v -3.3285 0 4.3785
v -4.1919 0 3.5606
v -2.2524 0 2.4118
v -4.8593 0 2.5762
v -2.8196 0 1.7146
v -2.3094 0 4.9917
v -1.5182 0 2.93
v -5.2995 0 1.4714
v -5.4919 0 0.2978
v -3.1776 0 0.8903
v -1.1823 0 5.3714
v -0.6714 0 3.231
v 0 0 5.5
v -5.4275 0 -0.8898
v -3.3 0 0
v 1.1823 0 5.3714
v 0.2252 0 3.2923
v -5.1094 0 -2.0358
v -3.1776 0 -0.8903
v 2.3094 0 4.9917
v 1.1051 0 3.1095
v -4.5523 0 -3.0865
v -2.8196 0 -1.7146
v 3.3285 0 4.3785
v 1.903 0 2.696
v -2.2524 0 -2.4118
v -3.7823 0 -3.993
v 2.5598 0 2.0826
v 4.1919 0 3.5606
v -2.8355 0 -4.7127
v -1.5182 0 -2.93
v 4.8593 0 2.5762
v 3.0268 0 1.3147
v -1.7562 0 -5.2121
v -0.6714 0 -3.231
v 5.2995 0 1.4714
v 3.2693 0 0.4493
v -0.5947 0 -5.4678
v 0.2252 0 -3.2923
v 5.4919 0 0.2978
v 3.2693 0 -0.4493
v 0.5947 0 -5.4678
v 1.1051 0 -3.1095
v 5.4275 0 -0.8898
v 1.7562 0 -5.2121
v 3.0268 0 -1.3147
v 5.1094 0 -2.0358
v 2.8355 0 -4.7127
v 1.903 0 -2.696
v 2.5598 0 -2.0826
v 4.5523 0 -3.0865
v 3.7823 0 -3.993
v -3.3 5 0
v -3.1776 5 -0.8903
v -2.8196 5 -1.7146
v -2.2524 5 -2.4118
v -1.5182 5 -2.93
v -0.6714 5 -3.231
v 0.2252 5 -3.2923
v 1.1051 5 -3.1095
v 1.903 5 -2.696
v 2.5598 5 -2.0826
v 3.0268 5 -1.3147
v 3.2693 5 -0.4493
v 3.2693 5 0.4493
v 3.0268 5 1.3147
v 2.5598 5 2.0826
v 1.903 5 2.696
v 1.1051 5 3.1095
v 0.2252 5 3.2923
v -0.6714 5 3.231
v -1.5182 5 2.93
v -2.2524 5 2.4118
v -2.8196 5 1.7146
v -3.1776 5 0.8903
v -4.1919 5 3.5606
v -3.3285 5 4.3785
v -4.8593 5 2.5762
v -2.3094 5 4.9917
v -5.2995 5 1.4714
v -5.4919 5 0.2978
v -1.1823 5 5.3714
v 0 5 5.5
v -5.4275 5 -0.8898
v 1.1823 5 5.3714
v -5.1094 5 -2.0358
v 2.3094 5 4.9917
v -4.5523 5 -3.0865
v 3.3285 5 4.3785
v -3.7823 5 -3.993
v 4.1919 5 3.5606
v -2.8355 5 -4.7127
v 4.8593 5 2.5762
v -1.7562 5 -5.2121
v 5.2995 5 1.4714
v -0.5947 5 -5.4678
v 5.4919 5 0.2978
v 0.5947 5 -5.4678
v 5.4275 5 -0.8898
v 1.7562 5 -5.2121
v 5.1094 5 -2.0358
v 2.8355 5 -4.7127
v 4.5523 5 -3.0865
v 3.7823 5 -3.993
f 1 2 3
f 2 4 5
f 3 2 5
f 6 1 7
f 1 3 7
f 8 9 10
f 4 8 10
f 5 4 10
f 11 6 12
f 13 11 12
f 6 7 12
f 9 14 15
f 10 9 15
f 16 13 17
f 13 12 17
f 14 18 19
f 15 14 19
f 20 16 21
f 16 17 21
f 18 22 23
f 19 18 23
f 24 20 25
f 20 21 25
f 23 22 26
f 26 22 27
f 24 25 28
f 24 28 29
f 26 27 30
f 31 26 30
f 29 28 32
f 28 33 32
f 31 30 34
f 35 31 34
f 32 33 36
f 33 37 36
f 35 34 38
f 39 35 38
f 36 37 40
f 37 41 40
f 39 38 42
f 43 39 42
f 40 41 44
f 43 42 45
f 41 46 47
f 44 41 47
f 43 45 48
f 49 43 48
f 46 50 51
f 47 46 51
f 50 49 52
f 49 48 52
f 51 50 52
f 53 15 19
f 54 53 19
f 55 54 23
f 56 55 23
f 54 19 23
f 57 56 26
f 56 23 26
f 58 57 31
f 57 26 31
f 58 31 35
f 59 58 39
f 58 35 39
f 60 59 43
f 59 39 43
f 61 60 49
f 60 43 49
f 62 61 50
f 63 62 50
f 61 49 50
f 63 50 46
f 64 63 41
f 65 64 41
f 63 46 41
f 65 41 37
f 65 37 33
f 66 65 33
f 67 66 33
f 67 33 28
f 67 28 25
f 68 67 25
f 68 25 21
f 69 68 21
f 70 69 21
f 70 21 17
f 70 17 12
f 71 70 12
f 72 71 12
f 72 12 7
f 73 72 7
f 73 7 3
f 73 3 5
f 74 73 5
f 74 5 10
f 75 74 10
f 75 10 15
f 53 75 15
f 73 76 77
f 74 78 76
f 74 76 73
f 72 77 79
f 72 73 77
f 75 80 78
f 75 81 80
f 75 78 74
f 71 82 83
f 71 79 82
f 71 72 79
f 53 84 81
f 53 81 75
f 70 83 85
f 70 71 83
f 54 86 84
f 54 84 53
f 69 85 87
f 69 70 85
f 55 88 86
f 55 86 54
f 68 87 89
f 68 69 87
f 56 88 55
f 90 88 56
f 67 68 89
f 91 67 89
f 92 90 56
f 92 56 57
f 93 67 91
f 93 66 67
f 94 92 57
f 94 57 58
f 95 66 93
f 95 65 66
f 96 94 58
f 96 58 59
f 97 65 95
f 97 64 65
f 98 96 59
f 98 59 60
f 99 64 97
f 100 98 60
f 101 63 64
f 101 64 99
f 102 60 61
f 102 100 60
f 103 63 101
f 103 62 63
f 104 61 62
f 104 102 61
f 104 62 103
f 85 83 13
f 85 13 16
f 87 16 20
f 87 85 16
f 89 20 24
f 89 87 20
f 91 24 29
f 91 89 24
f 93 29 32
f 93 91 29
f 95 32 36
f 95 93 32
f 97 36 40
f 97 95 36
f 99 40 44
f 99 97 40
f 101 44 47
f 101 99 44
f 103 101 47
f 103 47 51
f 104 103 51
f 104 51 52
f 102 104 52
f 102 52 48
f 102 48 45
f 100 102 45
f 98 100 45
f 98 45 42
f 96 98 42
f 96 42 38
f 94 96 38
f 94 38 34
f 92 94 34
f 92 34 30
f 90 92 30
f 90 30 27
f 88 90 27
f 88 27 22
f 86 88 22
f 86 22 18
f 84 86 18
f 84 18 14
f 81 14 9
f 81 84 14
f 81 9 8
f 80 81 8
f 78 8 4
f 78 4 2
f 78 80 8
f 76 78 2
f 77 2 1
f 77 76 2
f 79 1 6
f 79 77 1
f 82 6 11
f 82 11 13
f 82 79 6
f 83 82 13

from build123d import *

# Parameters (mm, degrees)
SKETCH1_W            = 11
SKETCH1_H            = 11
BOSS_EXTRUDE1_DEPTH  = 5
M6_CLEARANCE_HOLE1_D = 6.6
SKETCH4_OUTSIDE_W    = 16.268
SKETCH4_OUTSIDE_H    = 16.268
SKETCH4_OUTSIDE_R    = 5.5
CUT_EXTRUDE1_DEPTH   = 10.246621004


with BuildPart() as part:
    # Sketch1 → Boss-Extrude1 (new body)
    with BuildSketch(Plane(origin=(0, 0, 0), x_dir=(1, 0, 0), z_dir=(0, 1, 0))):
        Rectangle(SKETCH1_W, SKETCH1_H)
    extrude(amount=BOSS_EXTRUDE1_DEPTH)

    # M6 Clearance Hole1 (through all)
    with Locations(Plane(origin=(0, 5, 0), x_dir=(1, 0, 0), z_dir=(0, 1, 0))):
        with Locations((0, 0)):
            Hole(M6_CLEARANCE_HOLE1_D / 2)

    # Sketch4 outside → Cut-Extrude1 (cut, through all)
    with BuildSketch(Plane(origin=(0, 5, 0), x_dir=(1, 0, 0), z_dir=(0, 1, 0))):
        Rectangle(SKETCH4_OUTSIDE_W, SKETCH4_OUTSIDE_H)
        with Locations(Location((0, 0, 0), (0, 0, 270))):
            Circle(SKETCH4_OUTSIDE_R, mode=Mode.SUBTRACT)
    extrude(amount=-CUT_EXTRUDE1_DEPTH, mode=Mode.SUBTRACT)


solid = part.part
